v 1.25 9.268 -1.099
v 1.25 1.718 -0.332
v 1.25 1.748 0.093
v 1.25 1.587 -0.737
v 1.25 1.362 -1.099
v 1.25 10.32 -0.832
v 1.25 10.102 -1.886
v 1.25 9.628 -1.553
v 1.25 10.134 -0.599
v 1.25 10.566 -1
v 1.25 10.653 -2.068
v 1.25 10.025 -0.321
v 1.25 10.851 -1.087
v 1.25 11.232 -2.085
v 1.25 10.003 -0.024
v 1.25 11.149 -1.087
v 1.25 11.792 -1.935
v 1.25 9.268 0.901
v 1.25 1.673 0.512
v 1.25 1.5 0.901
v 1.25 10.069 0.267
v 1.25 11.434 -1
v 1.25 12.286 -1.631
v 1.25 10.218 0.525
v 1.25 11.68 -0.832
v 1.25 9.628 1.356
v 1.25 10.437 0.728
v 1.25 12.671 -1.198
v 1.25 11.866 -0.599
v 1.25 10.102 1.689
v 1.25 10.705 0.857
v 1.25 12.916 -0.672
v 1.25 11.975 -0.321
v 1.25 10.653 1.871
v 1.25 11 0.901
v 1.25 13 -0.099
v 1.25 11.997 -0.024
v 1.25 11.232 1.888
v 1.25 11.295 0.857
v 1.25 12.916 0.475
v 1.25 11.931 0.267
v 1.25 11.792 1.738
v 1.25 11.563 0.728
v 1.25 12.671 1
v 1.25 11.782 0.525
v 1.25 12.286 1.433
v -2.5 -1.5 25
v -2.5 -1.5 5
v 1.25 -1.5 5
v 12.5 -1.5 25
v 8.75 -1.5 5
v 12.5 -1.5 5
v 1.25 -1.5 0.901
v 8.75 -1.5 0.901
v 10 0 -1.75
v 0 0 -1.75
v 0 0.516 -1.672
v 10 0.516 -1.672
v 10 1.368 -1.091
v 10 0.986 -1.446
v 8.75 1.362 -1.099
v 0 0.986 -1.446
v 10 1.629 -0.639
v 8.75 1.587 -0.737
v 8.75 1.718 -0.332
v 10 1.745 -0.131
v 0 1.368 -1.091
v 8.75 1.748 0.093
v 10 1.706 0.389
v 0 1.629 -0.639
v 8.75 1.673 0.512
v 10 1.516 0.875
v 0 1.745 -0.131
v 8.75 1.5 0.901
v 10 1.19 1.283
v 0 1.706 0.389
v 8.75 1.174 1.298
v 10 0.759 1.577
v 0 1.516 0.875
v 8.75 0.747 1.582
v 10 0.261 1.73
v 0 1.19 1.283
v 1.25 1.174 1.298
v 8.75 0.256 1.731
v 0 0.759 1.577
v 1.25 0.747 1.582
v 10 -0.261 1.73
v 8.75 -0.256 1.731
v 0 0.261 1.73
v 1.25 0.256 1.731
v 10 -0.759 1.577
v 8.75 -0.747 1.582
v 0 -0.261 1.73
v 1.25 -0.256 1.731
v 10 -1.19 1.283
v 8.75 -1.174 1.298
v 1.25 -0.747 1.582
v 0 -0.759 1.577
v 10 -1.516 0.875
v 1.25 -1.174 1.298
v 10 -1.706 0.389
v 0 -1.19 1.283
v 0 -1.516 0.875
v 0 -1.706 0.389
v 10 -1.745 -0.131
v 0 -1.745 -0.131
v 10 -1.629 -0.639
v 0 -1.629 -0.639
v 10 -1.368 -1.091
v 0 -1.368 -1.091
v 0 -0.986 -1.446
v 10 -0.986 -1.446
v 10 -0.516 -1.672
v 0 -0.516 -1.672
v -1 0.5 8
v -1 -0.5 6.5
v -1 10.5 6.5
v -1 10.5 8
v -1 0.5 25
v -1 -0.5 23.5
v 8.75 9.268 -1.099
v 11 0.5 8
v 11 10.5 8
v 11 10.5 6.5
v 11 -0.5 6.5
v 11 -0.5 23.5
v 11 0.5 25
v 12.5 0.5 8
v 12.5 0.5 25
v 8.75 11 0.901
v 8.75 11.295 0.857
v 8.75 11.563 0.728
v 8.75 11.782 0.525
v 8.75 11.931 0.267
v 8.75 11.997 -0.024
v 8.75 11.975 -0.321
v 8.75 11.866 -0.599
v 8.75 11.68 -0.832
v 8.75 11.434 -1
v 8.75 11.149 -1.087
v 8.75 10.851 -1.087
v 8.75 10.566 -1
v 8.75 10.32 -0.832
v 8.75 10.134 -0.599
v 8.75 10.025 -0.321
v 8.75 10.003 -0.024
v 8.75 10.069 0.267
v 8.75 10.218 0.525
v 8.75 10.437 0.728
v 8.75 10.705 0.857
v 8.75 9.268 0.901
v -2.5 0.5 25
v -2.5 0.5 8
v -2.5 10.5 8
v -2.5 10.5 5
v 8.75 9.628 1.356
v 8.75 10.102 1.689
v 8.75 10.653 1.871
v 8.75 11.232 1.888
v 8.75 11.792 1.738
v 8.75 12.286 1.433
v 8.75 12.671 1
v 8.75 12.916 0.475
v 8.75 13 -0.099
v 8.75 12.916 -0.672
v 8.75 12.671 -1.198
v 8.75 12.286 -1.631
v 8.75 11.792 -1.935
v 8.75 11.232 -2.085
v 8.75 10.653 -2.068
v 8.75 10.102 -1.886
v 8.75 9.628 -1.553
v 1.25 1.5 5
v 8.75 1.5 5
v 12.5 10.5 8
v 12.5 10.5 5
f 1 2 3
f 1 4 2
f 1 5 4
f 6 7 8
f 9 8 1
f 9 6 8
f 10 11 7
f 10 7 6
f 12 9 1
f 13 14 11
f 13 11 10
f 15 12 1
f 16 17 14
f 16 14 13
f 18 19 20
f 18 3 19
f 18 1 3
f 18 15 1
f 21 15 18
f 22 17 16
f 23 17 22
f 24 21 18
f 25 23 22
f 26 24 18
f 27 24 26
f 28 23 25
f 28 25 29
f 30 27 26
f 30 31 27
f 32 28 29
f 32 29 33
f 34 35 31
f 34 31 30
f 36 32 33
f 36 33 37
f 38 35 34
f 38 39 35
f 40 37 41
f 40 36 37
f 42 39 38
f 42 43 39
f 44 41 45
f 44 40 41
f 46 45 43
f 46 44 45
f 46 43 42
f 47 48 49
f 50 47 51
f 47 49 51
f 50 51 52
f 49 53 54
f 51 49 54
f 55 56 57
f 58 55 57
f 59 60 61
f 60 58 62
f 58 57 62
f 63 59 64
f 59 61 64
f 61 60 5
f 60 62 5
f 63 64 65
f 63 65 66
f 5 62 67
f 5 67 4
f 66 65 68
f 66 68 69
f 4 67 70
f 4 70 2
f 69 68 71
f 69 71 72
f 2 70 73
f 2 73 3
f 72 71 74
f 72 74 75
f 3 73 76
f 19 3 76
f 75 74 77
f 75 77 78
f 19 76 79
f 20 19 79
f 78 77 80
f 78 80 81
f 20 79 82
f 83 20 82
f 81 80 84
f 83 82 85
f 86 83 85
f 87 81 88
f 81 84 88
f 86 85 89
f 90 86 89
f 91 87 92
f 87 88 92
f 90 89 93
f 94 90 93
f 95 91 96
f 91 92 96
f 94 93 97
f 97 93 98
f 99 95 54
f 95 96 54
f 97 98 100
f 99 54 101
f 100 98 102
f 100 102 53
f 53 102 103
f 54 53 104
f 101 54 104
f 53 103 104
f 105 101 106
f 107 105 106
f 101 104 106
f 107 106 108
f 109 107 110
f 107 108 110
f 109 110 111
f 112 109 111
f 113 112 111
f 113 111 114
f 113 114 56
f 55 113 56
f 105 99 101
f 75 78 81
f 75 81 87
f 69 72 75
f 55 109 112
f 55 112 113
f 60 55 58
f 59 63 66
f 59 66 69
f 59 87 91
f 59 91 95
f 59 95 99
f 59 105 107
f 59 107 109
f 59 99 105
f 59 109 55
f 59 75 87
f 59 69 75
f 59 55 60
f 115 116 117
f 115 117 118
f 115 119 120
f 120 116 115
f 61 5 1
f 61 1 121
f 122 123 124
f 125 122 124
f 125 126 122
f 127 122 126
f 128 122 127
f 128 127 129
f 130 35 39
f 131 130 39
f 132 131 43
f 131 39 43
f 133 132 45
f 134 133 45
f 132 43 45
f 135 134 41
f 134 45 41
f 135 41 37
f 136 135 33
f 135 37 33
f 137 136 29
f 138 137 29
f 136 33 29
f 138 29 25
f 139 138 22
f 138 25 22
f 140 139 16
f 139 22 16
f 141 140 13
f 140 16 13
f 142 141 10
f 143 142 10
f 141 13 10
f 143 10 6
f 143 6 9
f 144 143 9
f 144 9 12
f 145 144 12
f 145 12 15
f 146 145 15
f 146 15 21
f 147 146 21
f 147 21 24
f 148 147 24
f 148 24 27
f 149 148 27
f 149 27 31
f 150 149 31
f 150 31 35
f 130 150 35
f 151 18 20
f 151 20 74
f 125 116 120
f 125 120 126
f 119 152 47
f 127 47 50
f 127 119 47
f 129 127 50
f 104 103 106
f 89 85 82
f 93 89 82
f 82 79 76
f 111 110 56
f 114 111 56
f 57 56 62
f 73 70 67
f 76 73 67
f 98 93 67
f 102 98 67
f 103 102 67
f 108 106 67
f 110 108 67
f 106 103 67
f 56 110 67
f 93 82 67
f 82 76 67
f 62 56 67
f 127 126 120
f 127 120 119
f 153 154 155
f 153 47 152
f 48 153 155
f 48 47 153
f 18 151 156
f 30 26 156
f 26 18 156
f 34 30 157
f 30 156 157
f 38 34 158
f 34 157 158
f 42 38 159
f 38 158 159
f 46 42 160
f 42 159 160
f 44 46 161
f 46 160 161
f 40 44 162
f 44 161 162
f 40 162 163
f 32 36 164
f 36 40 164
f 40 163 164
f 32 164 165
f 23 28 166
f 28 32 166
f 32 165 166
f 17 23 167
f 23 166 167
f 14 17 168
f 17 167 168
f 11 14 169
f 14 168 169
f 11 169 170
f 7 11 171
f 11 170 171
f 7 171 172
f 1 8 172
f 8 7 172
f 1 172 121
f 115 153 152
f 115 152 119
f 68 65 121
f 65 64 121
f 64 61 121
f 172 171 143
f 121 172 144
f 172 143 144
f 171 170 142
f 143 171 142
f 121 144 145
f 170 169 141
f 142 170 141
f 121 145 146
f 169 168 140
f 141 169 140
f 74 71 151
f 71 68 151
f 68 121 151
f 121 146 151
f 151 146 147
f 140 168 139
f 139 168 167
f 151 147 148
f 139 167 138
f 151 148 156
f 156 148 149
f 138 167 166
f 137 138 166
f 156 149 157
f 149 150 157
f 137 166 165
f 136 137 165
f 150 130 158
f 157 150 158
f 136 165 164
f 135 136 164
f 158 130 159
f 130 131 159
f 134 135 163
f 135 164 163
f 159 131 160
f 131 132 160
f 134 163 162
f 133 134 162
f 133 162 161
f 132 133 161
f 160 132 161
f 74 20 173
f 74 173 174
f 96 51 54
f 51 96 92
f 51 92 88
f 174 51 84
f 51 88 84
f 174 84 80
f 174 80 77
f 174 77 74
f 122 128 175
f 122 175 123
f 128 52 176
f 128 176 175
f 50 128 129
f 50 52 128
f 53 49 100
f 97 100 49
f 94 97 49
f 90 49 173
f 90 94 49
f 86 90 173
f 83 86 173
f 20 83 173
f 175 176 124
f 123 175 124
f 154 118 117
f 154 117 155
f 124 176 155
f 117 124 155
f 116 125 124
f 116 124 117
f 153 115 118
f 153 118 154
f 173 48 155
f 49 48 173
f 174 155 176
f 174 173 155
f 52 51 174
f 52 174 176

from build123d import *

# Parameters (mm, degrees)
SKETCH2_R           = 1.75
BOSS_EXTRUDE1_DEPTH = 10
SKETCH3_W           = 7.5
SKETCH3_H           = 3
BOSS_EXTRUDE2_DEPTH = 5
SKETCH4_W           = 15
SKETCH4_H           = 2
BOSS_EXTRUDE3_DEPTH = 20
SKETCH5_W           = 12
SKETCH5_H           = 17
CUT_EXTRUDE1_DEPTH  = 1
CUT_EXTRUDE2_DEPTH  = 12
BOSS_EXTRUDE4_DEPTH = 10
SKETCH8_W           = 7.5
SKETCH8_H           = 2
BOSS_EXTRUDE5_DEPTH = 11
BOSS_EXTRUDE6_START = -7.5
SKETCH9_R           = 2
BOSS_EXTRUDE6_DEPTH = 7.5
SKETCH10_R          = 1
CUT_EXTRUDE3_DEPTH  = 31.340772897


with BuildPart() as part:
    # Sketch2 → Boss-Extrude1 (new body)
    with BuildSketch(Plane(origin=(0, 0, 0), x_dir=(0, 0, -1), z_dir=(1, 0, 0))):
        Circle(SKETCH2_R)
    extrude(amount=BOSS_EXTRUDE1_DEPTH)

    # Sketch3 → Boss-Extrude2 (add)
    with BuildSketch(Plane.XY):
        with Locations((5, 0)):
            Rectangle(SKETCH3_W, SKETCH3_H)
    extrude(amount=BOSS_EXTRUDE2_DEPTH)

    # Sketch4 → Boss-Extrude3 (add)
    with BuildSketch(Plane.XY.offset(5)):
        with Locations((5, -0.5)):
            Rectangle(SKETCH4_W, SKETCH4_H)
    extrude(amount=BOSS_EXTRUDE3_DEPTH)

    # Sketch5 → Cut-Extrude1 (cut)
    with BuildSketch(Plane(origin=(0, 0.5, 0), x_dir=(1, 0, 0), z_dir=(0, 1, 0))):
        with Locations((5, -15)):
            Rectangle(SKETCH5_W, SKETCH5_H)
    extrude(amount=-CUT_EXTRUDE1_DEPTH, mode=Mode.SUBTRACT)

    # Sketch6 → Cut-Extrude2 (cut)
    with BuildSketch(Plane.ZY.offset(-11)):
        Polygon((23.5, -0.5), (25, 0.5), (23.5, 0.5), align=None)
    extrude(amount=CUT_EXTRUDE2_DEPTH, mode=Mode.SUBTRACT)

    # Sketch7 → Boss-Extrude4 (add)
    with BuildSketch(Plane(origin=(0, 0.5, 0), x_dir=(1, 0, 0), z_dir=(0, 1, 0))):
        Polygon((-2.5, -5), (12.5, -5), (12.5, -8), (11, -8), (11, -6.5), (-1, -6.5), (-1, -8), (-2.5, -8), align=None)
    extrude(amount=BOSS_EXTRUDE4_DEPTH)

    # Sketch8 → Boss-Extrude5 (add)
    with BuildSketch(Plane(origin=(0, 0, 0), x_dir=(1, 0, 0), z_dir=(0, 1, 0))):
        with Locations((5, 0.098612181)):
            Rectangle(SKETCH8_W, SKETCH8_H)
    extrude(amount=BOSS_EXTRUDE5_DEPTH)

    # Sketch9 → Boss-Extrude6 (add)
    with BuildSketch(Plane.ZY.offset(-1.25).offset(BOSS_EXTRUDE6_START)):
        with Locations((-0.098612181, 11)):
            Circle(SKETCH9_R)
    extrude(amount=BOSS_EXTRUDE6_DEPTH)

    # Sketch10 → Cut-Extrude3 (cut, through all)
    with BuildSketch(Plane.ZY.offset(-1.25)):
        with Locations((-0.098612181, 11)):
            Circle(SKETCH10_R)
    extrude(amount=-CUT_EXTRUDE3_DEPTH, mode=Mode.SUBTRACT)


solid = part.part
